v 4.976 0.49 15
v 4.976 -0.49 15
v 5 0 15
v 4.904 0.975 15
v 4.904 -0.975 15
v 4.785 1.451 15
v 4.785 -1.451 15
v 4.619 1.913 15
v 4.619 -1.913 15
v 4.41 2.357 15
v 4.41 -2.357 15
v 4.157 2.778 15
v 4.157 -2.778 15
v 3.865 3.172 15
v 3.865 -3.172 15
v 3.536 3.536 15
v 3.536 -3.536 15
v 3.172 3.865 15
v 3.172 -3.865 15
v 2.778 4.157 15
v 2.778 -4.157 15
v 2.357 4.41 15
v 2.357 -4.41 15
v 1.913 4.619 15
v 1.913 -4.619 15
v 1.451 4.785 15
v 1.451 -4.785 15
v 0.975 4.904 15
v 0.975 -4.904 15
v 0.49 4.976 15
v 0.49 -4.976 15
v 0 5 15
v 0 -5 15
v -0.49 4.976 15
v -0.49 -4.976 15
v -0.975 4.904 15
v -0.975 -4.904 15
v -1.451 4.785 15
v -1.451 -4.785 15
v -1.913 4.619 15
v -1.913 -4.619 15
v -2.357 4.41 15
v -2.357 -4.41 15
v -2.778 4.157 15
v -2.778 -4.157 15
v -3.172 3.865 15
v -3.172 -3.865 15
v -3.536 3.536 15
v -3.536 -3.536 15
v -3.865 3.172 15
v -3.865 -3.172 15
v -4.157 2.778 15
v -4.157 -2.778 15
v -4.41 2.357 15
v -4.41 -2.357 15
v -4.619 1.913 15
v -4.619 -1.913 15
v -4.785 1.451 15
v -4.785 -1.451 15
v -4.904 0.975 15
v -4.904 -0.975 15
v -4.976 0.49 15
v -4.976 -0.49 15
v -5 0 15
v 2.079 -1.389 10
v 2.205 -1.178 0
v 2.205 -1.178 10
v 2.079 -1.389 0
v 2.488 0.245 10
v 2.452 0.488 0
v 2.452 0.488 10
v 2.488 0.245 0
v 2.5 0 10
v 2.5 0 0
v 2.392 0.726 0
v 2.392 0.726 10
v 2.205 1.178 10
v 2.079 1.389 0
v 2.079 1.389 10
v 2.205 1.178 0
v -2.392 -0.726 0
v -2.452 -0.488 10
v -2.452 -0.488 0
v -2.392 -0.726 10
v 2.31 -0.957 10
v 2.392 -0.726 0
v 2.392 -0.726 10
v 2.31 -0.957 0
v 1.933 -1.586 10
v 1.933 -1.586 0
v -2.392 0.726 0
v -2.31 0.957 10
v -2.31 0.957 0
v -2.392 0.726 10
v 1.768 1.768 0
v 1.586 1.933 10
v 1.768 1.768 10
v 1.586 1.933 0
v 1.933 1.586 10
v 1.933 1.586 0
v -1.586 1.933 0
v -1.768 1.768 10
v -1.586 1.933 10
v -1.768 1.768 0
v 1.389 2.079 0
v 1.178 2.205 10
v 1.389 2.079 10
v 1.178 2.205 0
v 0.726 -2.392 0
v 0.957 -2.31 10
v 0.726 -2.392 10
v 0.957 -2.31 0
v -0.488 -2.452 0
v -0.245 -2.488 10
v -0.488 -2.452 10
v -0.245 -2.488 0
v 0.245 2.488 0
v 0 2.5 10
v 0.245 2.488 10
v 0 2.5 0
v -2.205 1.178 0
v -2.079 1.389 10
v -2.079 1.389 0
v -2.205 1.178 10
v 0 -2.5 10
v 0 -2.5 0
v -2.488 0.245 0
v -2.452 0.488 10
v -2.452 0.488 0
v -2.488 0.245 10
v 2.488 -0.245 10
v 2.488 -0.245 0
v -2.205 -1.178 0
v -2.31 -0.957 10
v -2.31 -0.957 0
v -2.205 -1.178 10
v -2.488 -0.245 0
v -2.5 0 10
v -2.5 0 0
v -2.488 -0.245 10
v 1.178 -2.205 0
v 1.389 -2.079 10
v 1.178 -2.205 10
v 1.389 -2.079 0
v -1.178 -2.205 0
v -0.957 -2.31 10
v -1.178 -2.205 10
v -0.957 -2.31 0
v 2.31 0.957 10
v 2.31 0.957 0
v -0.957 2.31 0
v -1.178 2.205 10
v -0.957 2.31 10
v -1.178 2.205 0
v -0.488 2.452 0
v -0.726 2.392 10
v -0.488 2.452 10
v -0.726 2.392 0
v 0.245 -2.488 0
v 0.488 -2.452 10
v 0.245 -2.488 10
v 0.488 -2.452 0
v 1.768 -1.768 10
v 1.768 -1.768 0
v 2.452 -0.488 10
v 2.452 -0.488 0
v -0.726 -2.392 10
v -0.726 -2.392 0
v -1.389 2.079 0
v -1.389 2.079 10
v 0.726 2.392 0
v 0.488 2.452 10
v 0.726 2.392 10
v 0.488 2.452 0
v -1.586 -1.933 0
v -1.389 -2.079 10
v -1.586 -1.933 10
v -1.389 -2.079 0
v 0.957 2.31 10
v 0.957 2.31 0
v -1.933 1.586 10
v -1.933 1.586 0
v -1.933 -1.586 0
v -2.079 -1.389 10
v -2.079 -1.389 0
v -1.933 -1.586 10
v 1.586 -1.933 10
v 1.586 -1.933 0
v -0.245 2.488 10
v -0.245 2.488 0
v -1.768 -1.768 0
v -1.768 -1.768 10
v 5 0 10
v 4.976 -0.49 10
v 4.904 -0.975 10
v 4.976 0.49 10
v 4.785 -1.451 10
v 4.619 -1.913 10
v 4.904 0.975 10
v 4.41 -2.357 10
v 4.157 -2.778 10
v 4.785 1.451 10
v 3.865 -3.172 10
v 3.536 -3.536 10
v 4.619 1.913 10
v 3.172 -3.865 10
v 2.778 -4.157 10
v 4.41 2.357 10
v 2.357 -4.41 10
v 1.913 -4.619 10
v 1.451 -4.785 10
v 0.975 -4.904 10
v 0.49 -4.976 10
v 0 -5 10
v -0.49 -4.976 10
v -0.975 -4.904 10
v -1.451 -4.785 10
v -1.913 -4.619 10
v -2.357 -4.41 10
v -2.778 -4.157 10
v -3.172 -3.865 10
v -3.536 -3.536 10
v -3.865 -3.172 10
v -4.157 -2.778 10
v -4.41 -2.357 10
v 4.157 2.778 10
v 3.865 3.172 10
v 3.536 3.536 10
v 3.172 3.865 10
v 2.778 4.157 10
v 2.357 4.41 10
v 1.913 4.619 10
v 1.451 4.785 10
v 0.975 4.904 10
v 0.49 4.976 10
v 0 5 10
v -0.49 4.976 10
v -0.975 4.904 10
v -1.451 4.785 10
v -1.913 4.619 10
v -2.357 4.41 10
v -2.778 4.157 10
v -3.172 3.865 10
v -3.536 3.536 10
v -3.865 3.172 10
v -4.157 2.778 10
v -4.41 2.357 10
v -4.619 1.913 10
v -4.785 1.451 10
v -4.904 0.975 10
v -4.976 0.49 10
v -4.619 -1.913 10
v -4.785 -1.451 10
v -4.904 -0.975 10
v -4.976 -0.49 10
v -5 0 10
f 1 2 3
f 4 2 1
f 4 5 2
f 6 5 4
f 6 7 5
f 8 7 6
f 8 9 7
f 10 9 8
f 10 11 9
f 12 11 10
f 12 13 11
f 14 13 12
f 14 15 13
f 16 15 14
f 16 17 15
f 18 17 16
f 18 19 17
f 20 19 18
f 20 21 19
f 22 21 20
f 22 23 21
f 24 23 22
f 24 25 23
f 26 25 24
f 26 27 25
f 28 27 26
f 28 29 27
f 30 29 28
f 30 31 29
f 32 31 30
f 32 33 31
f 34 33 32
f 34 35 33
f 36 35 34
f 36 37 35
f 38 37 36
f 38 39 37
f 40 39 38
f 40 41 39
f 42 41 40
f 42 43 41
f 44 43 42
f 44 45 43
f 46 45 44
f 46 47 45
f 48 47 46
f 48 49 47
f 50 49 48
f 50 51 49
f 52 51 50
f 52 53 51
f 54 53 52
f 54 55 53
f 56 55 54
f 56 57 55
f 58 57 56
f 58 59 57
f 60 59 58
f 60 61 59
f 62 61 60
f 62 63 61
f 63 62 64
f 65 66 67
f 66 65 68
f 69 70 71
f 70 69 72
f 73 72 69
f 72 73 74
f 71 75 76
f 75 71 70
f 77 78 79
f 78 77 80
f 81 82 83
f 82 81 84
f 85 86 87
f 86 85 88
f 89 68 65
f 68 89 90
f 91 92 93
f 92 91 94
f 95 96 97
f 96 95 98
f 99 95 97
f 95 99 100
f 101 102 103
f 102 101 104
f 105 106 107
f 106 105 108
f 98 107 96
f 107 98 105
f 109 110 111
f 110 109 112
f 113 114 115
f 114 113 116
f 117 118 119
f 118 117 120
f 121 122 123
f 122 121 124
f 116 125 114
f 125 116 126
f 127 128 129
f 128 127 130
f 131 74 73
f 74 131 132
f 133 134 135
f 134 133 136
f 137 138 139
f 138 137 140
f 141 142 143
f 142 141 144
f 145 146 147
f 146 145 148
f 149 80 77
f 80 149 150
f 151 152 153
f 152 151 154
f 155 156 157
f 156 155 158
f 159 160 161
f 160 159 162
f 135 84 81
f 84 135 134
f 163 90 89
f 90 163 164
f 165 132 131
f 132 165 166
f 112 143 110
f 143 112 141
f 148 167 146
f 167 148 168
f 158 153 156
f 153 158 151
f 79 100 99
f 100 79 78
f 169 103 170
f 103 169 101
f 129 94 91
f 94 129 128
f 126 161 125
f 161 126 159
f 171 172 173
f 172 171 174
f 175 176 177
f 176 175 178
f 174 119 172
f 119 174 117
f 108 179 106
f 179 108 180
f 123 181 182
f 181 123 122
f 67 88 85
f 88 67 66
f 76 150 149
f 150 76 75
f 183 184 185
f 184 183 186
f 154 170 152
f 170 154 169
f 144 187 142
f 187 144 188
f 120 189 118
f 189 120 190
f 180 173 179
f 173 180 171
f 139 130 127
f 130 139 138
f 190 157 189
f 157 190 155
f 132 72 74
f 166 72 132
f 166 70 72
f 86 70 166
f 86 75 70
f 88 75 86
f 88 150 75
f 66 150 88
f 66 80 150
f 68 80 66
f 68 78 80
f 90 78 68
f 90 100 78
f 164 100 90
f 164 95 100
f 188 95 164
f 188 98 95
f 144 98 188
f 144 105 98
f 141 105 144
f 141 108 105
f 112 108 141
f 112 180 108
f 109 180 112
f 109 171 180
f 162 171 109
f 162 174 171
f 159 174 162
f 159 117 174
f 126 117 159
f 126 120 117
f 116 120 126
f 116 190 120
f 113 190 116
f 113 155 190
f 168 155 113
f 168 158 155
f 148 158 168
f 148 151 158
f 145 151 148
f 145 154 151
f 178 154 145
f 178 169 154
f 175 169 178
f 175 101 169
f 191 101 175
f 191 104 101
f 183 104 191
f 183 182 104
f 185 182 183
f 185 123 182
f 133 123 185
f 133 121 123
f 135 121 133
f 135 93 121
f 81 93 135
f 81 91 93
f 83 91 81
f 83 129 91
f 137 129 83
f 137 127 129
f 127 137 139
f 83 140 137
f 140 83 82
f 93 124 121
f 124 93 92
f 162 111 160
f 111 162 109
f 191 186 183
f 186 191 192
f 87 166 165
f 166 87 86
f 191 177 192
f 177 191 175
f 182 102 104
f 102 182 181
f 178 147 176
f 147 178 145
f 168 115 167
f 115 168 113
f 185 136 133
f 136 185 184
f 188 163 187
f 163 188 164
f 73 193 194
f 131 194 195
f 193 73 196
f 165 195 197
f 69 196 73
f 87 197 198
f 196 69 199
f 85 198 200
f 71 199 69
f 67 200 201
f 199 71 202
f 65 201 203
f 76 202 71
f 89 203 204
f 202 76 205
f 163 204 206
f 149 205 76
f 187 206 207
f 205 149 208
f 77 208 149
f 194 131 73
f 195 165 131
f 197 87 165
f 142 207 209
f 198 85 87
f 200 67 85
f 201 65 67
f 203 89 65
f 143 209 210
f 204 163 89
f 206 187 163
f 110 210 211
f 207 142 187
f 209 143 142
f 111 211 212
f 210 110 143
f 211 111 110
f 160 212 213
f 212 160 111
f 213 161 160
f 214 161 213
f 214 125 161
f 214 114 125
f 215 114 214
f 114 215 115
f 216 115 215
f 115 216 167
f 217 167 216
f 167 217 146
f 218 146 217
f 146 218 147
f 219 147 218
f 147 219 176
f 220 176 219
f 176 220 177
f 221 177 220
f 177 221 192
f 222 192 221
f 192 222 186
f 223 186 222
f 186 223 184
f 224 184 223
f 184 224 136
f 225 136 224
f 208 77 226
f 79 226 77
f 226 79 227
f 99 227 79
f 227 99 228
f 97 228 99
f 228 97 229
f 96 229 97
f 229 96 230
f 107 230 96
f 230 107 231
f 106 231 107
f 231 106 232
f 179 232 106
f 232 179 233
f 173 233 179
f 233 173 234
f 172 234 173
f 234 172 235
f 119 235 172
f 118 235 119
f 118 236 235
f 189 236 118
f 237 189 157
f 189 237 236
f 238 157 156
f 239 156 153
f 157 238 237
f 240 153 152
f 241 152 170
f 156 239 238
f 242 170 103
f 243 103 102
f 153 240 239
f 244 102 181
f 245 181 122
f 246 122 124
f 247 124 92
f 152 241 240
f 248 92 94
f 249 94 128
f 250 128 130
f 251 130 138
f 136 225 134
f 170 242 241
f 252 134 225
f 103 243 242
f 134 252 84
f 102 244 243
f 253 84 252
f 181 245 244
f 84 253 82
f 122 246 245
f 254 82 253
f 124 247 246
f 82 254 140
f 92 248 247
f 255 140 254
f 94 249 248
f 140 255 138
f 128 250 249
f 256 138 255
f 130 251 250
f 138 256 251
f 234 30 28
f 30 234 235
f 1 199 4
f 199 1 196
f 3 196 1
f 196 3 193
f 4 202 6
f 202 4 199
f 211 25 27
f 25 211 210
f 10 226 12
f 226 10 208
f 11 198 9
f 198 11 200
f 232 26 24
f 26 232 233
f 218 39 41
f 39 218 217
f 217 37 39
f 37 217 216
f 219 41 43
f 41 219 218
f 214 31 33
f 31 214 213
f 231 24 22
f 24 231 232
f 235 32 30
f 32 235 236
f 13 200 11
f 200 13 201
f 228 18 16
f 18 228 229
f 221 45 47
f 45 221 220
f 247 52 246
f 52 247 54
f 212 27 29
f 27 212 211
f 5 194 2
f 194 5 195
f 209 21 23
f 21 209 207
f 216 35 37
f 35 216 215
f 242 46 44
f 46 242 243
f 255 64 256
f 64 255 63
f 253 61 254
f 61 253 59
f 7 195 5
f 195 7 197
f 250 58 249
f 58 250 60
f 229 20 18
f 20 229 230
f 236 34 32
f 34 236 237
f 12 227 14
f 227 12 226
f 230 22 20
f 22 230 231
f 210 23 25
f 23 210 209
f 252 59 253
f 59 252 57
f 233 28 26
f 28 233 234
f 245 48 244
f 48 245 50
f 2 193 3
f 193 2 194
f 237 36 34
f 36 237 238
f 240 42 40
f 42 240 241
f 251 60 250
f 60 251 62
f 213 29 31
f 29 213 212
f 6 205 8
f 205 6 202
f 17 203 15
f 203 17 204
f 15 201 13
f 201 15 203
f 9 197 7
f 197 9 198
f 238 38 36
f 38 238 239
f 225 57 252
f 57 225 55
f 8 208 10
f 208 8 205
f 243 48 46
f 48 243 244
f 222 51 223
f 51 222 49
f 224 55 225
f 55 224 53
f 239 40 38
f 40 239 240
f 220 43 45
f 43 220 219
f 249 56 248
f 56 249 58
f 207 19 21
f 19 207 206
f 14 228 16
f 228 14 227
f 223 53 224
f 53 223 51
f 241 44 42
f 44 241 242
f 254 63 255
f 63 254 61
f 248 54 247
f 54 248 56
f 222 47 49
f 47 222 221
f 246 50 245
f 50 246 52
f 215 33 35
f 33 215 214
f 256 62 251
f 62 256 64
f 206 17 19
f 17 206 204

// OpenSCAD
module socket_head_cap_screw() {
    union() {
        // Screw shaft
        cylinder(h=10, d=5, $fn=64);
        
        // Screw head
        translate([0, 0, 10])
            cylinder(h=5, d=10, $fn=64);
        
        // Hex socket
        translate([0, 0, 10])
            difference() {
                cylinder(h=5, d=5, $fn=64);
                translate([0, 0, 0.5])
                    rotate([0, 0, 30])
                        cylinder(h=4, d=4, $fn=6);
            }
    }
}

socket_head_cap_screw();
